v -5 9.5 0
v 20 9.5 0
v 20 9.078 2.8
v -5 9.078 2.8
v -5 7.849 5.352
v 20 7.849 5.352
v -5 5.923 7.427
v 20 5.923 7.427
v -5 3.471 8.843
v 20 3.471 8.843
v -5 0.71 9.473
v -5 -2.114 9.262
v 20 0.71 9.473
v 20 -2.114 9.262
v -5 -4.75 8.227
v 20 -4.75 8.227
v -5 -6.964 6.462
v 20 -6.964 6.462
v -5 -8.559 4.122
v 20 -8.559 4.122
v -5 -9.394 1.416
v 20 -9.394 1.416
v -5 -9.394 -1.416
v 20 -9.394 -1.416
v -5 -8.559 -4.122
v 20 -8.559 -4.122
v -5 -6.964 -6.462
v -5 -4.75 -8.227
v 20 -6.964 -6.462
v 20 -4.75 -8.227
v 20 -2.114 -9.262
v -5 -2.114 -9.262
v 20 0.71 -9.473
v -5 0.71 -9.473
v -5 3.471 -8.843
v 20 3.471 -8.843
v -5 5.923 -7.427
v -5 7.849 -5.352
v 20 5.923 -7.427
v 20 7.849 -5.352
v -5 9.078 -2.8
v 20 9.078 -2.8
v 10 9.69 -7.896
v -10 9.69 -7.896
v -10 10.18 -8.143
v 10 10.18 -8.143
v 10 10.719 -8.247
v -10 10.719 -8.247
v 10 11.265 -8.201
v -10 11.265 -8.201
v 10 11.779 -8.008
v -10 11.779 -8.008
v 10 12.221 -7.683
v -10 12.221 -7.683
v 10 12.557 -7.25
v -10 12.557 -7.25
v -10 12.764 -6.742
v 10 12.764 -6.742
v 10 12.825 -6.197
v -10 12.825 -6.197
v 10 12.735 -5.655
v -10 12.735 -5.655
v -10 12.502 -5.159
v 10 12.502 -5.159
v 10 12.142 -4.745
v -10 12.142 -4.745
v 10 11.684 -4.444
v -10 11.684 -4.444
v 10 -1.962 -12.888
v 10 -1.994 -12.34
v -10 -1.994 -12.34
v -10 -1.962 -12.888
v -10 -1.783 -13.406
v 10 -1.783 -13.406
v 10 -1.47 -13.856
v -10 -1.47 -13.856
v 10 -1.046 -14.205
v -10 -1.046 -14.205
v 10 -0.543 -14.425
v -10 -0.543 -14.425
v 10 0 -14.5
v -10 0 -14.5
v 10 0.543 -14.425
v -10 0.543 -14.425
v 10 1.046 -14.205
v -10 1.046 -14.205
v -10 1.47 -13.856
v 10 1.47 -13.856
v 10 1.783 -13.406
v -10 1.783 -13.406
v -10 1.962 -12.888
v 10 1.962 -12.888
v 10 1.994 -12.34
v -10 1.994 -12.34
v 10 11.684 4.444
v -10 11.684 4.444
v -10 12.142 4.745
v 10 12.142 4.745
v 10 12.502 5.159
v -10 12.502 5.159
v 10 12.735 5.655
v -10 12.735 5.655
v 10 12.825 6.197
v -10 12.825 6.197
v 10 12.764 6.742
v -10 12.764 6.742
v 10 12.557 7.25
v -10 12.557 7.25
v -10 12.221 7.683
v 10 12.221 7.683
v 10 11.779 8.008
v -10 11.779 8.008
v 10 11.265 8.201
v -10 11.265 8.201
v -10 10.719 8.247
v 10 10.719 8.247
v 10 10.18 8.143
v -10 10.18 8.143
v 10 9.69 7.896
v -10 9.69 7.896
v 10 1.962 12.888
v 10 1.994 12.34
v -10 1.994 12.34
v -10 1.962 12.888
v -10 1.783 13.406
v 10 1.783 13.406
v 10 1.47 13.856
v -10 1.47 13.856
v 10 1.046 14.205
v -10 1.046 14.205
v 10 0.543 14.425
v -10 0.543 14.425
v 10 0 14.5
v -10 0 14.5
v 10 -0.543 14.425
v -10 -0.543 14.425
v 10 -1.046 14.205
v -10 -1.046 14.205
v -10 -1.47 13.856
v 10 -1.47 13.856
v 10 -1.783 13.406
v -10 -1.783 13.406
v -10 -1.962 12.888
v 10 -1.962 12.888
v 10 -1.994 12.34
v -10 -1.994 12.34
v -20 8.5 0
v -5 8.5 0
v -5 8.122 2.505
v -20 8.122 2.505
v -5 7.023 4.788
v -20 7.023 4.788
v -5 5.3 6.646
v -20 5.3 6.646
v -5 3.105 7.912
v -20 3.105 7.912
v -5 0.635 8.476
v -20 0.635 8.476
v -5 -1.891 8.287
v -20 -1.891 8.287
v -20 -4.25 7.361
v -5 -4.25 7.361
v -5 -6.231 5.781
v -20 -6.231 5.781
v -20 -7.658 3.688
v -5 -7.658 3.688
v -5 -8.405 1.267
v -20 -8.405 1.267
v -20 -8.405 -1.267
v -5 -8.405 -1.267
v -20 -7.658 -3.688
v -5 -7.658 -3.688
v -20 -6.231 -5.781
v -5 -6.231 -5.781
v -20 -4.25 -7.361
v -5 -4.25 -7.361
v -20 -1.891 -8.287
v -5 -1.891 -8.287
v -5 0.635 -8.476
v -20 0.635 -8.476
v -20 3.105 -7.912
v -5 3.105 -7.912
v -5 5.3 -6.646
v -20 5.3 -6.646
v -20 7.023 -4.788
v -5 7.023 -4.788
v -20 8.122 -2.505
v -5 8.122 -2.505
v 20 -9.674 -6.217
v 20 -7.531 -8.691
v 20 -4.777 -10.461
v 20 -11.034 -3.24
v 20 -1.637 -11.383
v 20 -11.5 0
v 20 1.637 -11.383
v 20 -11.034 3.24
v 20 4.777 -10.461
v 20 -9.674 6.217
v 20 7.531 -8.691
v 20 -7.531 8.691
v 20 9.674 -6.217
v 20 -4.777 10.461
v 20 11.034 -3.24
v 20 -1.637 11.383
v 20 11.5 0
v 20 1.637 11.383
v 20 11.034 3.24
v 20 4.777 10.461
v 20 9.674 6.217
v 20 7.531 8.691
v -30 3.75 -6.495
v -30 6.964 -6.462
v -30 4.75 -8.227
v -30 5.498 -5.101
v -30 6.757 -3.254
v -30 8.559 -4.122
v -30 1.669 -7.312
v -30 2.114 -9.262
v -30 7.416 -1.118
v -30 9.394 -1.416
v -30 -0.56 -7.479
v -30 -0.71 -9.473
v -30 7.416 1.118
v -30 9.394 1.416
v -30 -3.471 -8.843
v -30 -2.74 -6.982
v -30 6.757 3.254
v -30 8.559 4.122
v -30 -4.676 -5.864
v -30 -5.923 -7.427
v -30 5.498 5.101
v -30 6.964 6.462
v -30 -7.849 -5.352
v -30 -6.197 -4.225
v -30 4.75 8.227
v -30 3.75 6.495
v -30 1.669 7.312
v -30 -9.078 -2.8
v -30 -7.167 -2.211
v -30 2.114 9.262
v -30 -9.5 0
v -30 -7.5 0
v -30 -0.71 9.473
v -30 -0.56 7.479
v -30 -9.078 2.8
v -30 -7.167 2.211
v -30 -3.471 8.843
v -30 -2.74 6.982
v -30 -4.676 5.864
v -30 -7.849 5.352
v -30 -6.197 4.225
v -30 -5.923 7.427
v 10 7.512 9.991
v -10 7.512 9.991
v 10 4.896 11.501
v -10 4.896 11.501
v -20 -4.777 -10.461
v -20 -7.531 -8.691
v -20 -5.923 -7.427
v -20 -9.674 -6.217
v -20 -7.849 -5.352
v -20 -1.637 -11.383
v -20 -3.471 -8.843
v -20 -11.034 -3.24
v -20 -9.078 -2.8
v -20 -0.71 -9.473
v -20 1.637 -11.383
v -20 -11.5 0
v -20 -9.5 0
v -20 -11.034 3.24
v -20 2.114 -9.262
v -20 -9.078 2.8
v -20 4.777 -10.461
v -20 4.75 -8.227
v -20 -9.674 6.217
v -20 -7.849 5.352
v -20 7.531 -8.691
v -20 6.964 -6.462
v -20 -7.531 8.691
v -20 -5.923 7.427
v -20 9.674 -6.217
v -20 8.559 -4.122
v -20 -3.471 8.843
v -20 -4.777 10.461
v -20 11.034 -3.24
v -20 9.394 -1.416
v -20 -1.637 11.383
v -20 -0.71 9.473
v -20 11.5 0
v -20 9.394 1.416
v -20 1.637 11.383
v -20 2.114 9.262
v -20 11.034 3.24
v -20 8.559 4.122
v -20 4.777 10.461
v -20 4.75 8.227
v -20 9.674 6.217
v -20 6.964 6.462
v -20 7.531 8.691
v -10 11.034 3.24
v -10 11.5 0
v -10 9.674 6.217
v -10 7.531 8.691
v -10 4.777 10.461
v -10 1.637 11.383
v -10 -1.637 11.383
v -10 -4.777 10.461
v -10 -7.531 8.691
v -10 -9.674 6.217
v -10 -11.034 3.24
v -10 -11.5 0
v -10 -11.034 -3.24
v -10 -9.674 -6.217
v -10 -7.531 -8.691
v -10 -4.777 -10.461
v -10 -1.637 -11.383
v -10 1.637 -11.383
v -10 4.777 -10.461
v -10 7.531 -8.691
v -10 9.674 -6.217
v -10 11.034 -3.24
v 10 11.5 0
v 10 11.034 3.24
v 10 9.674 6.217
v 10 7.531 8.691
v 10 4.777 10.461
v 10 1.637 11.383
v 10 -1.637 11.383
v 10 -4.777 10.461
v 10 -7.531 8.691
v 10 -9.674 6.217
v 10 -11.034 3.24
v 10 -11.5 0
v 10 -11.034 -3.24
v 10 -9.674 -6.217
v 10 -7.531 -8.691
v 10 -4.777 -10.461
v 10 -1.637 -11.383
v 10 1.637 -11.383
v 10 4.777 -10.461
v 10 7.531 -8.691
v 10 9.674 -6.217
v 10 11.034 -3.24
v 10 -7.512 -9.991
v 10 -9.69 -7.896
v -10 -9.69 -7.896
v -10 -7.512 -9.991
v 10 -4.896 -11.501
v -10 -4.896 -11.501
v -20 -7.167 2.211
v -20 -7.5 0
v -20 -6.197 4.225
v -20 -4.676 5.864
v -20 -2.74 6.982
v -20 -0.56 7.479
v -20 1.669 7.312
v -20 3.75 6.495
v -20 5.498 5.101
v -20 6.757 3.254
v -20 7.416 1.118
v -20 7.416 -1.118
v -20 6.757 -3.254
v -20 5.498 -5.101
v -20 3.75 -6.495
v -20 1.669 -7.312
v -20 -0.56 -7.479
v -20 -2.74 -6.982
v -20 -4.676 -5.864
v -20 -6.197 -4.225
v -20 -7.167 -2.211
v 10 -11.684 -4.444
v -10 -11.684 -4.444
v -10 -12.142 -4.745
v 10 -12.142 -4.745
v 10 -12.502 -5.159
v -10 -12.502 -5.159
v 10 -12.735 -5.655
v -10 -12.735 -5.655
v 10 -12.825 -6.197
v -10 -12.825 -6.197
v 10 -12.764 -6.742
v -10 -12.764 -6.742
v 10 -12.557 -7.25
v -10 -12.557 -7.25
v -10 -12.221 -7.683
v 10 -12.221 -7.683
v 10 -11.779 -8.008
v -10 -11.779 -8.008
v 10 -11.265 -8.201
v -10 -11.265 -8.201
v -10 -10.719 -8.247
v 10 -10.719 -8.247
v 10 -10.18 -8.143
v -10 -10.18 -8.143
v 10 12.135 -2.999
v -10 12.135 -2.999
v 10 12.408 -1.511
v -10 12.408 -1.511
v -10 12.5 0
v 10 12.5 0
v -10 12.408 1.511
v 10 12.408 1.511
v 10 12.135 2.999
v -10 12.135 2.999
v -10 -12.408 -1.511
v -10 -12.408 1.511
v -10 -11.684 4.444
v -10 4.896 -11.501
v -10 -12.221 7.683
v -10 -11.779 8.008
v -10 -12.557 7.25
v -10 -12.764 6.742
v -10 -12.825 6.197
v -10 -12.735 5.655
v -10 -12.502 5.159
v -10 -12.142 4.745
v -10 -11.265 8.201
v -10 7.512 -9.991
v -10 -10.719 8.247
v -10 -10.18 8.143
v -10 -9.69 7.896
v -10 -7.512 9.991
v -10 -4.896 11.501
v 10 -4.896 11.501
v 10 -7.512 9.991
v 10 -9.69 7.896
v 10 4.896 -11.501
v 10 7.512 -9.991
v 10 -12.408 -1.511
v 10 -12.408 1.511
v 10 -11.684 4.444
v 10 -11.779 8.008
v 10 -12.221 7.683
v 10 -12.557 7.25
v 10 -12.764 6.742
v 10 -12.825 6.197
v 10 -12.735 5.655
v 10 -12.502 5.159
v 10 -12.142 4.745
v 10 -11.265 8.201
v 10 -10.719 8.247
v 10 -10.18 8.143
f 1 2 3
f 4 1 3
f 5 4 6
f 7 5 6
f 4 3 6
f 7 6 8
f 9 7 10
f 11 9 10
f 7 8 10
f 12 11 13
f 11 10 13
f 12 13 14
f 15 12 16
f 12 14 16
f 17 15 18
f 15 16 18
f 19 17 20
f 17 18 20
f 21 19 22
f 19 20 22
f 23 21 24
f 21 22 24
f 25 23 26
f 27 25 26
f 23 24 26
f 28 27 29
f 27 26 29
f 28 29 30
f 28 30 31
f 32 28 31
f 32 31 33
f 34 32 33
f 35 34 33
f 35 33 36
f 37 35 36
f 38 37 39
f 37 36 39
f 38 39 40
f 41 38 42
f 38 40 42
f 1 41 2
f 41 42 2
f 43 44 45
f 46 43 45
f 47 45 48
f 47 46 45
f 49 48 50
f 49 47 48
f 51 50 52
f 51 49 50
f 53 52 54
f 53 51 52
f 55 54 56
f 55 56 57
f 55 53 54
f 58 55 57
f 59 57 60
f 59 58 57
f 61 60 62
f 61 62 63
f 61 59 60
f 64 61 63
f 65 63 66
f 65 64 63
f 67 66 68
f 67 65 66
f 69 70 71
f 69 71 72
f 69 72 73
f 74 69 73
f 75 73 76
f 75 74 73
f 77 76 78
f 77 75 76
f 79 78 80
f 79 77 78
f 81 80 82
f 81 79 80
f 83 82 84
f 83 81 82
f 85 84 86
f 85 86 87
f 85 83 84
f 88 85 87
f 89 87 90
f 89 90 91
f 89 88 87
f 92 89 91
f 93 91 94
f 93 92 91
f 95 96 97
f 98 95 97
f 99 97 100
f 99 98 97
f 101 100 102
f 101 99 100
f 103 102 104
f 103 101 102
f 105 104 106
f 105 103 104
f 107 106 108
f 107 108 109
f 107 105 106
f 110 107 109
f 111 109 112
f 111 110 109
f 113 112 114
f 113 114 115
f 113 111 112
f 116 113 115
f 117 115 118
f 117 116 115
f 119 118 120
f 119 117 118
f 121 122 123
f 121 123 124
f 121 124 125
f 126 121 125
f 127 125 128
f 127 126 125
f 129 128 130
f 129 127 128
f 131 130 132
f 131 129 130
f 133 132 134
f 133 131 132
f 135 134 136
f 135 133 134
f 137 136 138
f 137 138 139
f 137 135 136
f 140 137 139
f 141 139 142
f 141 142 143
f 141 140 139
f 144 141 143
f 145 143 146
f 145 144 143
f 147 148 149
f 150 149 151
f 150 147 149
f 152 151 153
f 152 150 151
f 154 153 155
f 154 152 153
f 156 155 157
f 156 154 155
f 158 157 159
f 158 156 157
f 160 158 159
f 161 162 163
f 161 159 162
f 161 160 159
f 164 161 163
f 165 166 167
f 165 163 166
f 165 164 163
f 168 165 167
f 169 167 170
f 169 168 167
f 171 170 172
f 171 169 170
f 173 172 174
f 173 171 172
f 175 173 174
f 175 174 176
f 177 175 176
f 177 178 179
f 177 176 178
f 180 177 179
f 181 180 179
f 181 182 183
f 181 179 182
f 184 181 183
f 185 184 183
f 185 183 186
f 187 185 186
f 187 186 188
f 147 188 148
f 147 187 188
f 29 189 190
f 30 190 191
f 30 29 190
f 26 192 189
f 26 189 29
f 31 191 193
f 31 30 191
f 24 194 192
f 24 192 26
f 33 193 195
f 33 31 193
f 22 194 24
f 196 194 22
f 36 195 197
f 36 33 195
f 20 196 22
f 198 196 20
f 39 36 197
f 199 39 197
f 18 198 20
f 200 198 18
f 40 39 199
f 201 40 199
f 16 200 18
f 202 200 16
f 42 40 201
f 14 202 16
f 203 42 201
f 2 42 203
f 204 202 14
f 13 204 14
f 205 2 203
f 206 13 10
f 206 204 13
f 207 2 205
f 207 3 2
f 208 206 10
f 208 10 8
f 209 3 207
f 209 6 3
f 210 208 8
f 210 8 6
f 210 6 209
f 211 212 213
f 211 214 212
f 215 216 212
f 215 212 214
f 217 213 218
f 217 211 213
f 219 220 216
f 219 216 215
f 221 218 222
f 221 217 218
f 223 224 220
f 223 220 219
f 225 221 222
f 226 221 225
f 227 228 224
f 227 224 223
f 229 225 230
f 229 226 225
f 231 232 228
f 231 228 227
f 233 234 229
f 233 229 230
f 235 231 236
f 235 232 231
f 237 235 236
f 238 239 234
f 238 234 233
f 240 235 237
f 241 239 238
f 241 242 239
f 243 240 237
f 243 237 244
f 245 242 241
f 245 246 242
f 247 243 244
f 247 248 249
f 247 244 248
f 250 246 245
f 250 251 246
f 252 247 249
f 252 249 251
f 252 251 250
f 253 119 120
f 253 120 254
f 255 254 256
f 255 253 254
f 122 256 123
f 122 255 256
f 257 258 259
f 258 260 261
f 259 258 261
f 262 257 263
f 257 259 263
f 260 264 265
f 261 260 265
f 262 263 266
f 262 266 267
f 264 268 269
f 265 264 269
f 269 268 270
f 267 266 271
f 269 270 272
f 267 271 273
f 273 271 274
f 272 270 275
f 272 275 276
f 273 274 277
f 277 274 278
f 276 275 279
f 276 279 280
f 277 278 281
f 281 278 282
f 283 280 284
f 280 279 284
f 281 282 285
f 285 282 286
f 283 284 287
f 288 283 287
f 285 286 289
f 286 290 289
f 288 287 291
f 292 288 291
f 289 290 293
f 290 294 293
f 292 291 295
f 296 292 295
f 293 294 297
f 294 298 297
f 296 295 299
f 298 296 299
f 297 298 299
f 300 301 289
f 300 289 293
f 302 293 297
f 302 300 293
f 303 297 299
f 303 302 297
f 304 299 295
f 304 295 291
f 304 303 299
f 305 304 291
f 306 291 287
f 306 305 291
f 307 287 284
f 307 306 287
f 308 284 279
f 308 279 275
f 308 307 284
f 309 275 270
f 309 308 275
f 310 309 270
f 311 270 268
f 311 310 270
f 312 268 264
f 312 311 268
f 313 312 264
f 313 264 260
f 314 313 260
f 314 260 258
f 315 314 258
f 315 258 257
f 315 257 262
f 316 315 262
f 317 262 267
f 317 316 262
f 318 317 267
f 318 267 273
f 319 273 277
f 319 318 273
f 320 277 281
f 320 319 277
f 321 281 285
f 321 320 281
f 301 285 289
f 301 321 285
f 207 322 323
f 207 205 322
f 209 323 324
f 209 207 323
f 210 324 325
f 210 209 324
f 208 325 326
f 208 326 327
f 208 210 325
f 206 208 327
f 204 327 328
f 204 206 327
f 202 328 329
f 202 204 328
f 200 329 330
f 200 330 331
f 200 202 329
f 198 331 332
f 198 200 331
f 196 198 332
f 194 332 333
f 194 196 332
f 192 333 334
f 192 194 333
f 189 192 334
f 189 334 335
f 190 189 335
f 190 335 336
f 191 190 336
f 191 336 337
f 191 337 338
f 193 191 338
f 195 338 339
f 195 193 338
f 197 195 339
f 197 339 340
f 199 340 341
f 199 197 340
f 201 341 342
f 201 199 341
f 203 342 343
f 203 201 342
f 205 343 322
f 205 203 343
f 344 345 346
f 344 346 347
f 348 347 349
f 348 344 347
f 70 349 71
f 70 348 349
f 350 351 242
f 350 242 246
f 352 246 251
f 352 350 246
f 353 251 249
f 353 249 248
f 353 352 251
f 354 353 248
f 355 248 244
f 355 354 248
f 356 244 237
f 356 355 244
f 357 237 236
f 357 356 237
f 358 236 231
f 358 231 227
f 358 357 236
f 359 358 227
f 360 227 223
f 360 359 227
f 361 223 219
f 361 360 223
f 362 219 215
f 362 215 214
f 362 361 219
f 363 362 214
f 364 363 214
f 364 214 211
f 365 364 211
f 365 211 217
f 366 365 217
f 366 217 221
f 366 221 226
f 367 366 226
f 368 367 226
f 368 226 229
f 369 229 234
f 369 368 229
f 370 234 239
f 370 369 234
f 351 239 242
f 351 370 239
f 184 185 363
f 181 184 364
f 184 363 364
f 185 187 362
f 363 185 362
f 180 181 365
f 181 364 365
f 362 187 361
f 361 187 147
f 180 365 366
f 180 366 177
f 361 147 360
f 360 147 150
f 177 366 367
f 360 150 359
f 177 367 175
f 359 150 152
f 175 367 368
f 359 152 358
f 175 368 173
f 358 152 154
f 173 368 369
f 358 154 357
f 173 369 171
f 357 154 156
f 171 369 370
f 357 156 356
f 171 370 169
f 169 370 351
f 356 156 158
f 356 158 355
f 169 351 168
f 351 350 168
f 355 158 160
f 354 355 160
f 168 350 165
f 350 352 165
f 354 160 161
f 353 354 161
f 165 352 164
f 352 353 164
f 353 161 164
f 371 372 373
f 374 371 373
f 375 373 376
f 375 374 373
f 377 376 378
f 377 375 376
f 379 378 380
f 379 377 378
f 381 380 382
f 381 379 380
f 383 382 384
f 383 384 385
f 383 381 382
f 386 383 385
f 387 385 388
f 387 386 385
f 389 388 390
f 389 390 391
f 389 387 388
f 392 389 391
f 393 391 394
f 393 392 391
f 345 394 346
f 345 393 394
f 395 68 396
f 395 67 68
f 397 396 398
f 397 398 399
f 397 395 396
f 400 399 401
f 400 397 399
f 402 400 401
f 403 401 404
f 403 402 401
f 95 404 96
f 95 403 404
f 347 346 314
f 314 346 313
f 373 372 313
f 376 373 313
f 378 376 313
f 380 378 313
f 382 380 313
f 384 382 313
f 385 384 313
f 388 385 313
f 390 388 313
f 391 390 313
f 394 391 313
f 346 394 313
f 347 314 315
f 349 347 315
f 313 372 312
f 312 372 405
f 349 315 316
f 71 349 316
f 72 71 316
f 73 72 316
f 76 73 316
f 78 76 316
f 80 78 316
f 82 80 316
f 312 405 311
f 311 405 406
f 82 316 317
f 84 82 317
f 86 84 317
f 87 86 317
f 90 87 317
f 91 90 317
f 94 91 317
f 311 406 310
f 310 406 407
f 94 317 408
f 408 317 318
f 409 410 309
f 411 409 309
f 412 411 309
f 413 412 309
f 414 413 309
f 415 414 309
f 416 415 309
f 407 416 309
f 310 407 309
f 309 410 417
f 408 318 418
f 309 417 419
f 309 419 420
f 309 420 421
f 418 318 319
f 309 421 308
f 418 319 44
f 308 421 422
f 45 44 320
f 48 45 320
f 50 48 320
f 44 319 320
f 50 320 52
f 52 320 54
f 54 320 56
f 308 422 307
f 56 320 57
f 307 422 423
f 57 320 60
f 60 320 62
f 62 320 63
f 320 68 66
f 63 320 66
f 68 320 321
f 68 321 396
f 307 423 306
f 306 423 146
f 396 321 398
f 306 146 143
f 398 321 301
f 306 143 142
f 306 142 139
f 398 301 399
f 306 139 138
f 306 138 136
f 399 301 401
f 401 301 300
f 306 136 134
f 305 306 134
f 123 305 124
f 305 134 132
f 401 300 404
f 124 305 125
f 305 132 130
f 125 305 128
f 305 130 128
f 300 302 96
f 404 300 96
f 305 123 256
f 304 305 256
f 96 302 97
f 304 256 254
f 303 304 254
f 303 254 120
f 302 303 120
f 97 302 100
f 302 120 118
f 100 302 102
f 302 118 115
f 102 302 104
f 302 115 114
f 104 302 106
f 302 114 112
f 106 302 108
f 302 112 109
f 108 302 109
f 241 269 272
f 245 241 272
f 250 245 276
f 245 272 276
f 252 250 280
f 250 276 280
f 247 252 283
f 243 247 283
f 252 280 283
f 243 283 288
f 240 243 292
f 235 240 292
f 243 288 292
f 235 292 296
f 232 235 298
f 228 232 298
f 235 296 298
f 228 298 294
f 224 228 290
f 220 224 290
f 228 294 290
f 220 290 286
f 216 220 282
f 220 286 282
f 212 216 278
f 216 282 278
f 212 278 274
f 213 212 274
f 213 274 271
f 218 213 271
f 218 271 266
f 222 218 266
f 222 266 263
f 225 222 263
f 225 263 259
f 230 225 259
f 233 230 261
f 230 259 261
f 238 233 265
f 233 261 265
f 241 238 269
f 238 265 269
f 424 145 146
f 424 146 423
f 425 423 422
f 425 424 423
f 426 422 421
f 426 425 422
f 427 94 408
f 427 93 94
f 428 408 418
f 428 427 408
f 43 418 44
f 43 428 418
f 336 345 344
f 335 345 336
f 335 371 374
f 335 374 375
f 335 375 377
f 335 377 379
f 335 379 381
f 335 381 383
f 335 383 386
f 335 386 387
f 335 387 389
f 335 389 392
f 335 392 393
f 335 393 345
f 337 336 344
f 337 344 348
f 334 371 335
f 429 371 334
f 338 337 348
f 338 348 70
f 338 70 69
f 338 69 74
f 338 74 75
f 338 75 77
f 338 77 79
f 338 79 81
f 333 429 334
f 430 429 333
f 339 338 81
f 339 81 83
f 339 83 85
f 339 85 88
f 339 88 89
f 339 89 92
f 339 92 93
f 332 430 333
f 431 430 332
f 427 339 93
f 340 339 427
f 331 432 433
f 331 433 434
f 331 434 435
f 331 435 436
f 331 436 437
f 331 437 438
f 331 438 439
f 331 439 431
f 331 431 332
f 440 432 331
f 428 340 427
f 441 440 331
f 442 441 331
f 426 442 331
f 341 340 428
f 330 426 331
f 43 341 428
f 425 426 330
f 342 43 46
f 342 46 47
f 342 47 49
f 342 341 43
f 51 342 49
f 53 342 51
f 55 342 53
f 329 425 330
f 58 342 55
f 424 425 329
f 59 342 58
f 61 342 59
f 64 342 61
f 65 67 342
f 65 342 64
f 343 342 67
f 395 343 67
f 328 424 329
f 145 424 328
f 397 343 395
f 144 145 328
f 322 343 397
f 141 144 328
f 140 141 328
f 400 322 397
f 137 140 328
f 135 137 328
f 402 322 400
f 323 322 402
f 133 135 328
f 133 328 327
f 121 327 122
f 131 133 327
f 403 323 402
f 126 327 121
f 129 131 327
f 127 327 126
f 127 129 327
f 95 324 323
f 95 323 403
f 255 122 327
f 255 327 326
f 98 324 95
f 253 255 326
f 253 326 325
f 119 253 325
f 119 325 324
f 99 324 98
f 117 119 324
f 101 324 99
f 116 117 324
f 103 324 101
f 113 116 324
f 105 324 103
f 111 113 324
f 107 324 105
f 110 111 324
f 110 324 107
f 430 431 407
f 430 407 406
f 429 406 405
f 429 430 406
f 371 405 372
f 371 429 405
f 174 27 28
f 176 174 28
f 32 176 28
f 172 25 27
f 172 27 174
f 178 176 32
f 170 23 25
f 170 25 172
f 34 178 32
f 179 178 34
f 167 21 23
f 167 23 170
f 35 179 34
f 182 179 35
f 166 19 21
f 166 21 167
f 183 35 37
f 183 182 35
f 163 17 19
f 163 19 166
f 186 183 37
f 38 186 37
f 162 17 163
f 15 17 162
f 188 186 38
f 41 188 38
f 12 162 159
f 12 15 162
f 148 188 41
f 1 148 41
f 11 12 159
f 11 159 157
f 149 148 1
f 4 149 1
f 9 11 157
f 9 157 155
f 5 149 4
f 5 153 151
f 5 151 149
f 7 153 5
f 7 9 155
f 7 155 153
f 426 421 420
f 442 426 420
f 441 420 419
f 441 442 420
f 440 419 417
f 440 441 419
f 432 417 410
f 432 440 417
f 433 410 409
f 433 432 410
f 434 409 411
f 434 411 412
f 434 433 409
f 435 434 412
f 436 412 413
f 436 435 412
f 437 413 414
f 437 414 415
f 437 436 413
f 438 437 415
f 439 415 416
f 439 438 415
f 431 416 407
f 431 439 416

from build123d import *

# Parameters (mm, degrees)
F0_R     = 8.5
F1_DEPTH = 10
F2_R     = 11.5
F2_R_2   = 8.5
F3_DEPTH = 20
F4_R     = 9.5
F4_R_2   = 7.5
F5_DEPTH = 10
F6_R     = 9.5
F7_DEPTH = 25


with BuildPart() as f1:
    # F0 (on Right) → F1 (new body, symmetric)
    with BuildSketch(Plane.YZ):
        with BuildLine():
            ThreePointArc((11.6835483463, -4.4435006516), (12.2941928228, -2.2589428581), (12.5, 0))
            ThreePointArc((12.5, 0), (12.2941928228, 2.2589428581), (11.6835483463, 4.4435006516))
            ThreePointArc((11.6835483463, 4.4435006516), (10.8253175473, 6.25), (9.6899586191, 7.8964993484))
            ThreePointArc((9.6899586191, 7.8964993484), (6.25, 10.8253175473), (1.9935897271, 12.34))
            ThreePointArc((1.9935897271, 12.34), (0, 12.5), (-1.9935897271, 12.34))
            ThreePointArc((-1.9935897271, 12.34), (-6.25, 10.8253175473), (-9.6899586191, 7.8964993484))
            ThreePointArc((-9.6899586191, 7.8964993484), (-10.8253175473, 6.25), (-11.6835483463, 4.4435006516))
            ThreePointArc((-11.6835483463, 4.4435006516), (-12.5, 0), (-11.6835483463, -4.4435006516))
            ThreePointArc((-11.6835483463, -4.4435006516), (-10.8253175473, -6.25), (-9.6899586191, -7.8964993484))
            ThreePointArc((-9.6899586191, -7.8964993484), (-6.25, -10.8253175473), (-1.9935897271, -12.34))
            ThreePointArc((-1.9935897271, -12.34), (0, -12.5), (1.9935897271, -12.34))
            ThreePointArc((1.9935897271, -12.34), (6.25, -10.8253175473), (9.6899586191, -7.8964993484))
            ThreePointArc((9.6899586191, -7.8964993484), (10.8253175473, -6.25), (11.6835483463, -4.4435006516))
        make_face()
        Circle(F0_R, mode=Mode.SUBTRACT)
        with BuildLine():
            ThreePointArc((9.6899586191, 7.8964993484), (10.8253175473, 6.25), (11.6835483463, 4.4435006516))
            ThreePointArc((11.6835483463, 4.4435006516), (12.5573683549, 7.25), (9.6899586191, 7.8964993484))
        make_face()
        with BuildLine():
            ThreePointArc((9.6899586191, -7.8964993484), (12.5573683549, -7.25), (11.6835483463, -4.4435006516))
            ThreePointArc((11.6835483463, -4.4435006516), (10.8253175473, -6.25), (9.6899586191, -7.8964993484))
        make_face()
        with BuildLine():
            ThreePointArc((-1.9935897271, 12.34), (0, 12.5), (1.9935897271, 12.34))
            ThreePointArc((1.9935897271, 12.34), (0, 14.5), (-1.9935897271, 12.34))
        make_face()
        with BuildLine():
            ThreePointArc((-1.9935897271, -12.34), (0, -14.5), (1.9935897271, -12.34))
            ThreePointArc((1.9935897271, -12.34), (0, -12.5), (-1.9935897271, -12.34))
        make_face()
        with BuildLine():
            ThreePointArc((-11.6835483463, 4.4435006516), (-10.8253175473, 6.25), (-9.6899586191, 7.8964993484))
            ThreePointArc((-9.6899586191, 7.8964993484), (-12.5573683549, 7.25), (-11.6835483463, 4.4435006516))
        make_face()
        with BuildLine():
            ThreePointArc((-11.6835483463, -4.4435006516), (-12.5573683549, -7.25), (-9.6899586191, -7.8964993484))
            ThreePointArc((-9.6899586191, -7.8964993484), (-10.8253175473, -6.25), (-11.6835483463, -4.4435006516))
        make_face()
    extrude(amount=F1_DEPTH, both=True)

    # F2 (on Right) → F3 (join, symmetric)
    with BuildSketch(Plane.YZ):
        Circle(F2_R)
        Circle(F2_R_2, mode=Mode.SUBTRACT)
    extrude(amount=F3_DEPTH, both=True)

    # F4 (on face) → F5 (join)
    with BuildSketch(Plane(origin=(-20, 0, 0), x_dir=(0, -1, 0), z_dir=(-1, 0, 0))):
        Circle(F4_R)
        Circle(F4_R_2, mode=Mode.SUBTRACT)
    extrude(amount=F5_DEPTH)

    # F6 (on face) → F7 (cut)
    with BuildSketch(Plane.YZ.offset(20)):
        Circle(F6_R)
    extrude(amount=-F7_DEPTH, mode=Mode.SUBTRACT)


solid = f1.part
